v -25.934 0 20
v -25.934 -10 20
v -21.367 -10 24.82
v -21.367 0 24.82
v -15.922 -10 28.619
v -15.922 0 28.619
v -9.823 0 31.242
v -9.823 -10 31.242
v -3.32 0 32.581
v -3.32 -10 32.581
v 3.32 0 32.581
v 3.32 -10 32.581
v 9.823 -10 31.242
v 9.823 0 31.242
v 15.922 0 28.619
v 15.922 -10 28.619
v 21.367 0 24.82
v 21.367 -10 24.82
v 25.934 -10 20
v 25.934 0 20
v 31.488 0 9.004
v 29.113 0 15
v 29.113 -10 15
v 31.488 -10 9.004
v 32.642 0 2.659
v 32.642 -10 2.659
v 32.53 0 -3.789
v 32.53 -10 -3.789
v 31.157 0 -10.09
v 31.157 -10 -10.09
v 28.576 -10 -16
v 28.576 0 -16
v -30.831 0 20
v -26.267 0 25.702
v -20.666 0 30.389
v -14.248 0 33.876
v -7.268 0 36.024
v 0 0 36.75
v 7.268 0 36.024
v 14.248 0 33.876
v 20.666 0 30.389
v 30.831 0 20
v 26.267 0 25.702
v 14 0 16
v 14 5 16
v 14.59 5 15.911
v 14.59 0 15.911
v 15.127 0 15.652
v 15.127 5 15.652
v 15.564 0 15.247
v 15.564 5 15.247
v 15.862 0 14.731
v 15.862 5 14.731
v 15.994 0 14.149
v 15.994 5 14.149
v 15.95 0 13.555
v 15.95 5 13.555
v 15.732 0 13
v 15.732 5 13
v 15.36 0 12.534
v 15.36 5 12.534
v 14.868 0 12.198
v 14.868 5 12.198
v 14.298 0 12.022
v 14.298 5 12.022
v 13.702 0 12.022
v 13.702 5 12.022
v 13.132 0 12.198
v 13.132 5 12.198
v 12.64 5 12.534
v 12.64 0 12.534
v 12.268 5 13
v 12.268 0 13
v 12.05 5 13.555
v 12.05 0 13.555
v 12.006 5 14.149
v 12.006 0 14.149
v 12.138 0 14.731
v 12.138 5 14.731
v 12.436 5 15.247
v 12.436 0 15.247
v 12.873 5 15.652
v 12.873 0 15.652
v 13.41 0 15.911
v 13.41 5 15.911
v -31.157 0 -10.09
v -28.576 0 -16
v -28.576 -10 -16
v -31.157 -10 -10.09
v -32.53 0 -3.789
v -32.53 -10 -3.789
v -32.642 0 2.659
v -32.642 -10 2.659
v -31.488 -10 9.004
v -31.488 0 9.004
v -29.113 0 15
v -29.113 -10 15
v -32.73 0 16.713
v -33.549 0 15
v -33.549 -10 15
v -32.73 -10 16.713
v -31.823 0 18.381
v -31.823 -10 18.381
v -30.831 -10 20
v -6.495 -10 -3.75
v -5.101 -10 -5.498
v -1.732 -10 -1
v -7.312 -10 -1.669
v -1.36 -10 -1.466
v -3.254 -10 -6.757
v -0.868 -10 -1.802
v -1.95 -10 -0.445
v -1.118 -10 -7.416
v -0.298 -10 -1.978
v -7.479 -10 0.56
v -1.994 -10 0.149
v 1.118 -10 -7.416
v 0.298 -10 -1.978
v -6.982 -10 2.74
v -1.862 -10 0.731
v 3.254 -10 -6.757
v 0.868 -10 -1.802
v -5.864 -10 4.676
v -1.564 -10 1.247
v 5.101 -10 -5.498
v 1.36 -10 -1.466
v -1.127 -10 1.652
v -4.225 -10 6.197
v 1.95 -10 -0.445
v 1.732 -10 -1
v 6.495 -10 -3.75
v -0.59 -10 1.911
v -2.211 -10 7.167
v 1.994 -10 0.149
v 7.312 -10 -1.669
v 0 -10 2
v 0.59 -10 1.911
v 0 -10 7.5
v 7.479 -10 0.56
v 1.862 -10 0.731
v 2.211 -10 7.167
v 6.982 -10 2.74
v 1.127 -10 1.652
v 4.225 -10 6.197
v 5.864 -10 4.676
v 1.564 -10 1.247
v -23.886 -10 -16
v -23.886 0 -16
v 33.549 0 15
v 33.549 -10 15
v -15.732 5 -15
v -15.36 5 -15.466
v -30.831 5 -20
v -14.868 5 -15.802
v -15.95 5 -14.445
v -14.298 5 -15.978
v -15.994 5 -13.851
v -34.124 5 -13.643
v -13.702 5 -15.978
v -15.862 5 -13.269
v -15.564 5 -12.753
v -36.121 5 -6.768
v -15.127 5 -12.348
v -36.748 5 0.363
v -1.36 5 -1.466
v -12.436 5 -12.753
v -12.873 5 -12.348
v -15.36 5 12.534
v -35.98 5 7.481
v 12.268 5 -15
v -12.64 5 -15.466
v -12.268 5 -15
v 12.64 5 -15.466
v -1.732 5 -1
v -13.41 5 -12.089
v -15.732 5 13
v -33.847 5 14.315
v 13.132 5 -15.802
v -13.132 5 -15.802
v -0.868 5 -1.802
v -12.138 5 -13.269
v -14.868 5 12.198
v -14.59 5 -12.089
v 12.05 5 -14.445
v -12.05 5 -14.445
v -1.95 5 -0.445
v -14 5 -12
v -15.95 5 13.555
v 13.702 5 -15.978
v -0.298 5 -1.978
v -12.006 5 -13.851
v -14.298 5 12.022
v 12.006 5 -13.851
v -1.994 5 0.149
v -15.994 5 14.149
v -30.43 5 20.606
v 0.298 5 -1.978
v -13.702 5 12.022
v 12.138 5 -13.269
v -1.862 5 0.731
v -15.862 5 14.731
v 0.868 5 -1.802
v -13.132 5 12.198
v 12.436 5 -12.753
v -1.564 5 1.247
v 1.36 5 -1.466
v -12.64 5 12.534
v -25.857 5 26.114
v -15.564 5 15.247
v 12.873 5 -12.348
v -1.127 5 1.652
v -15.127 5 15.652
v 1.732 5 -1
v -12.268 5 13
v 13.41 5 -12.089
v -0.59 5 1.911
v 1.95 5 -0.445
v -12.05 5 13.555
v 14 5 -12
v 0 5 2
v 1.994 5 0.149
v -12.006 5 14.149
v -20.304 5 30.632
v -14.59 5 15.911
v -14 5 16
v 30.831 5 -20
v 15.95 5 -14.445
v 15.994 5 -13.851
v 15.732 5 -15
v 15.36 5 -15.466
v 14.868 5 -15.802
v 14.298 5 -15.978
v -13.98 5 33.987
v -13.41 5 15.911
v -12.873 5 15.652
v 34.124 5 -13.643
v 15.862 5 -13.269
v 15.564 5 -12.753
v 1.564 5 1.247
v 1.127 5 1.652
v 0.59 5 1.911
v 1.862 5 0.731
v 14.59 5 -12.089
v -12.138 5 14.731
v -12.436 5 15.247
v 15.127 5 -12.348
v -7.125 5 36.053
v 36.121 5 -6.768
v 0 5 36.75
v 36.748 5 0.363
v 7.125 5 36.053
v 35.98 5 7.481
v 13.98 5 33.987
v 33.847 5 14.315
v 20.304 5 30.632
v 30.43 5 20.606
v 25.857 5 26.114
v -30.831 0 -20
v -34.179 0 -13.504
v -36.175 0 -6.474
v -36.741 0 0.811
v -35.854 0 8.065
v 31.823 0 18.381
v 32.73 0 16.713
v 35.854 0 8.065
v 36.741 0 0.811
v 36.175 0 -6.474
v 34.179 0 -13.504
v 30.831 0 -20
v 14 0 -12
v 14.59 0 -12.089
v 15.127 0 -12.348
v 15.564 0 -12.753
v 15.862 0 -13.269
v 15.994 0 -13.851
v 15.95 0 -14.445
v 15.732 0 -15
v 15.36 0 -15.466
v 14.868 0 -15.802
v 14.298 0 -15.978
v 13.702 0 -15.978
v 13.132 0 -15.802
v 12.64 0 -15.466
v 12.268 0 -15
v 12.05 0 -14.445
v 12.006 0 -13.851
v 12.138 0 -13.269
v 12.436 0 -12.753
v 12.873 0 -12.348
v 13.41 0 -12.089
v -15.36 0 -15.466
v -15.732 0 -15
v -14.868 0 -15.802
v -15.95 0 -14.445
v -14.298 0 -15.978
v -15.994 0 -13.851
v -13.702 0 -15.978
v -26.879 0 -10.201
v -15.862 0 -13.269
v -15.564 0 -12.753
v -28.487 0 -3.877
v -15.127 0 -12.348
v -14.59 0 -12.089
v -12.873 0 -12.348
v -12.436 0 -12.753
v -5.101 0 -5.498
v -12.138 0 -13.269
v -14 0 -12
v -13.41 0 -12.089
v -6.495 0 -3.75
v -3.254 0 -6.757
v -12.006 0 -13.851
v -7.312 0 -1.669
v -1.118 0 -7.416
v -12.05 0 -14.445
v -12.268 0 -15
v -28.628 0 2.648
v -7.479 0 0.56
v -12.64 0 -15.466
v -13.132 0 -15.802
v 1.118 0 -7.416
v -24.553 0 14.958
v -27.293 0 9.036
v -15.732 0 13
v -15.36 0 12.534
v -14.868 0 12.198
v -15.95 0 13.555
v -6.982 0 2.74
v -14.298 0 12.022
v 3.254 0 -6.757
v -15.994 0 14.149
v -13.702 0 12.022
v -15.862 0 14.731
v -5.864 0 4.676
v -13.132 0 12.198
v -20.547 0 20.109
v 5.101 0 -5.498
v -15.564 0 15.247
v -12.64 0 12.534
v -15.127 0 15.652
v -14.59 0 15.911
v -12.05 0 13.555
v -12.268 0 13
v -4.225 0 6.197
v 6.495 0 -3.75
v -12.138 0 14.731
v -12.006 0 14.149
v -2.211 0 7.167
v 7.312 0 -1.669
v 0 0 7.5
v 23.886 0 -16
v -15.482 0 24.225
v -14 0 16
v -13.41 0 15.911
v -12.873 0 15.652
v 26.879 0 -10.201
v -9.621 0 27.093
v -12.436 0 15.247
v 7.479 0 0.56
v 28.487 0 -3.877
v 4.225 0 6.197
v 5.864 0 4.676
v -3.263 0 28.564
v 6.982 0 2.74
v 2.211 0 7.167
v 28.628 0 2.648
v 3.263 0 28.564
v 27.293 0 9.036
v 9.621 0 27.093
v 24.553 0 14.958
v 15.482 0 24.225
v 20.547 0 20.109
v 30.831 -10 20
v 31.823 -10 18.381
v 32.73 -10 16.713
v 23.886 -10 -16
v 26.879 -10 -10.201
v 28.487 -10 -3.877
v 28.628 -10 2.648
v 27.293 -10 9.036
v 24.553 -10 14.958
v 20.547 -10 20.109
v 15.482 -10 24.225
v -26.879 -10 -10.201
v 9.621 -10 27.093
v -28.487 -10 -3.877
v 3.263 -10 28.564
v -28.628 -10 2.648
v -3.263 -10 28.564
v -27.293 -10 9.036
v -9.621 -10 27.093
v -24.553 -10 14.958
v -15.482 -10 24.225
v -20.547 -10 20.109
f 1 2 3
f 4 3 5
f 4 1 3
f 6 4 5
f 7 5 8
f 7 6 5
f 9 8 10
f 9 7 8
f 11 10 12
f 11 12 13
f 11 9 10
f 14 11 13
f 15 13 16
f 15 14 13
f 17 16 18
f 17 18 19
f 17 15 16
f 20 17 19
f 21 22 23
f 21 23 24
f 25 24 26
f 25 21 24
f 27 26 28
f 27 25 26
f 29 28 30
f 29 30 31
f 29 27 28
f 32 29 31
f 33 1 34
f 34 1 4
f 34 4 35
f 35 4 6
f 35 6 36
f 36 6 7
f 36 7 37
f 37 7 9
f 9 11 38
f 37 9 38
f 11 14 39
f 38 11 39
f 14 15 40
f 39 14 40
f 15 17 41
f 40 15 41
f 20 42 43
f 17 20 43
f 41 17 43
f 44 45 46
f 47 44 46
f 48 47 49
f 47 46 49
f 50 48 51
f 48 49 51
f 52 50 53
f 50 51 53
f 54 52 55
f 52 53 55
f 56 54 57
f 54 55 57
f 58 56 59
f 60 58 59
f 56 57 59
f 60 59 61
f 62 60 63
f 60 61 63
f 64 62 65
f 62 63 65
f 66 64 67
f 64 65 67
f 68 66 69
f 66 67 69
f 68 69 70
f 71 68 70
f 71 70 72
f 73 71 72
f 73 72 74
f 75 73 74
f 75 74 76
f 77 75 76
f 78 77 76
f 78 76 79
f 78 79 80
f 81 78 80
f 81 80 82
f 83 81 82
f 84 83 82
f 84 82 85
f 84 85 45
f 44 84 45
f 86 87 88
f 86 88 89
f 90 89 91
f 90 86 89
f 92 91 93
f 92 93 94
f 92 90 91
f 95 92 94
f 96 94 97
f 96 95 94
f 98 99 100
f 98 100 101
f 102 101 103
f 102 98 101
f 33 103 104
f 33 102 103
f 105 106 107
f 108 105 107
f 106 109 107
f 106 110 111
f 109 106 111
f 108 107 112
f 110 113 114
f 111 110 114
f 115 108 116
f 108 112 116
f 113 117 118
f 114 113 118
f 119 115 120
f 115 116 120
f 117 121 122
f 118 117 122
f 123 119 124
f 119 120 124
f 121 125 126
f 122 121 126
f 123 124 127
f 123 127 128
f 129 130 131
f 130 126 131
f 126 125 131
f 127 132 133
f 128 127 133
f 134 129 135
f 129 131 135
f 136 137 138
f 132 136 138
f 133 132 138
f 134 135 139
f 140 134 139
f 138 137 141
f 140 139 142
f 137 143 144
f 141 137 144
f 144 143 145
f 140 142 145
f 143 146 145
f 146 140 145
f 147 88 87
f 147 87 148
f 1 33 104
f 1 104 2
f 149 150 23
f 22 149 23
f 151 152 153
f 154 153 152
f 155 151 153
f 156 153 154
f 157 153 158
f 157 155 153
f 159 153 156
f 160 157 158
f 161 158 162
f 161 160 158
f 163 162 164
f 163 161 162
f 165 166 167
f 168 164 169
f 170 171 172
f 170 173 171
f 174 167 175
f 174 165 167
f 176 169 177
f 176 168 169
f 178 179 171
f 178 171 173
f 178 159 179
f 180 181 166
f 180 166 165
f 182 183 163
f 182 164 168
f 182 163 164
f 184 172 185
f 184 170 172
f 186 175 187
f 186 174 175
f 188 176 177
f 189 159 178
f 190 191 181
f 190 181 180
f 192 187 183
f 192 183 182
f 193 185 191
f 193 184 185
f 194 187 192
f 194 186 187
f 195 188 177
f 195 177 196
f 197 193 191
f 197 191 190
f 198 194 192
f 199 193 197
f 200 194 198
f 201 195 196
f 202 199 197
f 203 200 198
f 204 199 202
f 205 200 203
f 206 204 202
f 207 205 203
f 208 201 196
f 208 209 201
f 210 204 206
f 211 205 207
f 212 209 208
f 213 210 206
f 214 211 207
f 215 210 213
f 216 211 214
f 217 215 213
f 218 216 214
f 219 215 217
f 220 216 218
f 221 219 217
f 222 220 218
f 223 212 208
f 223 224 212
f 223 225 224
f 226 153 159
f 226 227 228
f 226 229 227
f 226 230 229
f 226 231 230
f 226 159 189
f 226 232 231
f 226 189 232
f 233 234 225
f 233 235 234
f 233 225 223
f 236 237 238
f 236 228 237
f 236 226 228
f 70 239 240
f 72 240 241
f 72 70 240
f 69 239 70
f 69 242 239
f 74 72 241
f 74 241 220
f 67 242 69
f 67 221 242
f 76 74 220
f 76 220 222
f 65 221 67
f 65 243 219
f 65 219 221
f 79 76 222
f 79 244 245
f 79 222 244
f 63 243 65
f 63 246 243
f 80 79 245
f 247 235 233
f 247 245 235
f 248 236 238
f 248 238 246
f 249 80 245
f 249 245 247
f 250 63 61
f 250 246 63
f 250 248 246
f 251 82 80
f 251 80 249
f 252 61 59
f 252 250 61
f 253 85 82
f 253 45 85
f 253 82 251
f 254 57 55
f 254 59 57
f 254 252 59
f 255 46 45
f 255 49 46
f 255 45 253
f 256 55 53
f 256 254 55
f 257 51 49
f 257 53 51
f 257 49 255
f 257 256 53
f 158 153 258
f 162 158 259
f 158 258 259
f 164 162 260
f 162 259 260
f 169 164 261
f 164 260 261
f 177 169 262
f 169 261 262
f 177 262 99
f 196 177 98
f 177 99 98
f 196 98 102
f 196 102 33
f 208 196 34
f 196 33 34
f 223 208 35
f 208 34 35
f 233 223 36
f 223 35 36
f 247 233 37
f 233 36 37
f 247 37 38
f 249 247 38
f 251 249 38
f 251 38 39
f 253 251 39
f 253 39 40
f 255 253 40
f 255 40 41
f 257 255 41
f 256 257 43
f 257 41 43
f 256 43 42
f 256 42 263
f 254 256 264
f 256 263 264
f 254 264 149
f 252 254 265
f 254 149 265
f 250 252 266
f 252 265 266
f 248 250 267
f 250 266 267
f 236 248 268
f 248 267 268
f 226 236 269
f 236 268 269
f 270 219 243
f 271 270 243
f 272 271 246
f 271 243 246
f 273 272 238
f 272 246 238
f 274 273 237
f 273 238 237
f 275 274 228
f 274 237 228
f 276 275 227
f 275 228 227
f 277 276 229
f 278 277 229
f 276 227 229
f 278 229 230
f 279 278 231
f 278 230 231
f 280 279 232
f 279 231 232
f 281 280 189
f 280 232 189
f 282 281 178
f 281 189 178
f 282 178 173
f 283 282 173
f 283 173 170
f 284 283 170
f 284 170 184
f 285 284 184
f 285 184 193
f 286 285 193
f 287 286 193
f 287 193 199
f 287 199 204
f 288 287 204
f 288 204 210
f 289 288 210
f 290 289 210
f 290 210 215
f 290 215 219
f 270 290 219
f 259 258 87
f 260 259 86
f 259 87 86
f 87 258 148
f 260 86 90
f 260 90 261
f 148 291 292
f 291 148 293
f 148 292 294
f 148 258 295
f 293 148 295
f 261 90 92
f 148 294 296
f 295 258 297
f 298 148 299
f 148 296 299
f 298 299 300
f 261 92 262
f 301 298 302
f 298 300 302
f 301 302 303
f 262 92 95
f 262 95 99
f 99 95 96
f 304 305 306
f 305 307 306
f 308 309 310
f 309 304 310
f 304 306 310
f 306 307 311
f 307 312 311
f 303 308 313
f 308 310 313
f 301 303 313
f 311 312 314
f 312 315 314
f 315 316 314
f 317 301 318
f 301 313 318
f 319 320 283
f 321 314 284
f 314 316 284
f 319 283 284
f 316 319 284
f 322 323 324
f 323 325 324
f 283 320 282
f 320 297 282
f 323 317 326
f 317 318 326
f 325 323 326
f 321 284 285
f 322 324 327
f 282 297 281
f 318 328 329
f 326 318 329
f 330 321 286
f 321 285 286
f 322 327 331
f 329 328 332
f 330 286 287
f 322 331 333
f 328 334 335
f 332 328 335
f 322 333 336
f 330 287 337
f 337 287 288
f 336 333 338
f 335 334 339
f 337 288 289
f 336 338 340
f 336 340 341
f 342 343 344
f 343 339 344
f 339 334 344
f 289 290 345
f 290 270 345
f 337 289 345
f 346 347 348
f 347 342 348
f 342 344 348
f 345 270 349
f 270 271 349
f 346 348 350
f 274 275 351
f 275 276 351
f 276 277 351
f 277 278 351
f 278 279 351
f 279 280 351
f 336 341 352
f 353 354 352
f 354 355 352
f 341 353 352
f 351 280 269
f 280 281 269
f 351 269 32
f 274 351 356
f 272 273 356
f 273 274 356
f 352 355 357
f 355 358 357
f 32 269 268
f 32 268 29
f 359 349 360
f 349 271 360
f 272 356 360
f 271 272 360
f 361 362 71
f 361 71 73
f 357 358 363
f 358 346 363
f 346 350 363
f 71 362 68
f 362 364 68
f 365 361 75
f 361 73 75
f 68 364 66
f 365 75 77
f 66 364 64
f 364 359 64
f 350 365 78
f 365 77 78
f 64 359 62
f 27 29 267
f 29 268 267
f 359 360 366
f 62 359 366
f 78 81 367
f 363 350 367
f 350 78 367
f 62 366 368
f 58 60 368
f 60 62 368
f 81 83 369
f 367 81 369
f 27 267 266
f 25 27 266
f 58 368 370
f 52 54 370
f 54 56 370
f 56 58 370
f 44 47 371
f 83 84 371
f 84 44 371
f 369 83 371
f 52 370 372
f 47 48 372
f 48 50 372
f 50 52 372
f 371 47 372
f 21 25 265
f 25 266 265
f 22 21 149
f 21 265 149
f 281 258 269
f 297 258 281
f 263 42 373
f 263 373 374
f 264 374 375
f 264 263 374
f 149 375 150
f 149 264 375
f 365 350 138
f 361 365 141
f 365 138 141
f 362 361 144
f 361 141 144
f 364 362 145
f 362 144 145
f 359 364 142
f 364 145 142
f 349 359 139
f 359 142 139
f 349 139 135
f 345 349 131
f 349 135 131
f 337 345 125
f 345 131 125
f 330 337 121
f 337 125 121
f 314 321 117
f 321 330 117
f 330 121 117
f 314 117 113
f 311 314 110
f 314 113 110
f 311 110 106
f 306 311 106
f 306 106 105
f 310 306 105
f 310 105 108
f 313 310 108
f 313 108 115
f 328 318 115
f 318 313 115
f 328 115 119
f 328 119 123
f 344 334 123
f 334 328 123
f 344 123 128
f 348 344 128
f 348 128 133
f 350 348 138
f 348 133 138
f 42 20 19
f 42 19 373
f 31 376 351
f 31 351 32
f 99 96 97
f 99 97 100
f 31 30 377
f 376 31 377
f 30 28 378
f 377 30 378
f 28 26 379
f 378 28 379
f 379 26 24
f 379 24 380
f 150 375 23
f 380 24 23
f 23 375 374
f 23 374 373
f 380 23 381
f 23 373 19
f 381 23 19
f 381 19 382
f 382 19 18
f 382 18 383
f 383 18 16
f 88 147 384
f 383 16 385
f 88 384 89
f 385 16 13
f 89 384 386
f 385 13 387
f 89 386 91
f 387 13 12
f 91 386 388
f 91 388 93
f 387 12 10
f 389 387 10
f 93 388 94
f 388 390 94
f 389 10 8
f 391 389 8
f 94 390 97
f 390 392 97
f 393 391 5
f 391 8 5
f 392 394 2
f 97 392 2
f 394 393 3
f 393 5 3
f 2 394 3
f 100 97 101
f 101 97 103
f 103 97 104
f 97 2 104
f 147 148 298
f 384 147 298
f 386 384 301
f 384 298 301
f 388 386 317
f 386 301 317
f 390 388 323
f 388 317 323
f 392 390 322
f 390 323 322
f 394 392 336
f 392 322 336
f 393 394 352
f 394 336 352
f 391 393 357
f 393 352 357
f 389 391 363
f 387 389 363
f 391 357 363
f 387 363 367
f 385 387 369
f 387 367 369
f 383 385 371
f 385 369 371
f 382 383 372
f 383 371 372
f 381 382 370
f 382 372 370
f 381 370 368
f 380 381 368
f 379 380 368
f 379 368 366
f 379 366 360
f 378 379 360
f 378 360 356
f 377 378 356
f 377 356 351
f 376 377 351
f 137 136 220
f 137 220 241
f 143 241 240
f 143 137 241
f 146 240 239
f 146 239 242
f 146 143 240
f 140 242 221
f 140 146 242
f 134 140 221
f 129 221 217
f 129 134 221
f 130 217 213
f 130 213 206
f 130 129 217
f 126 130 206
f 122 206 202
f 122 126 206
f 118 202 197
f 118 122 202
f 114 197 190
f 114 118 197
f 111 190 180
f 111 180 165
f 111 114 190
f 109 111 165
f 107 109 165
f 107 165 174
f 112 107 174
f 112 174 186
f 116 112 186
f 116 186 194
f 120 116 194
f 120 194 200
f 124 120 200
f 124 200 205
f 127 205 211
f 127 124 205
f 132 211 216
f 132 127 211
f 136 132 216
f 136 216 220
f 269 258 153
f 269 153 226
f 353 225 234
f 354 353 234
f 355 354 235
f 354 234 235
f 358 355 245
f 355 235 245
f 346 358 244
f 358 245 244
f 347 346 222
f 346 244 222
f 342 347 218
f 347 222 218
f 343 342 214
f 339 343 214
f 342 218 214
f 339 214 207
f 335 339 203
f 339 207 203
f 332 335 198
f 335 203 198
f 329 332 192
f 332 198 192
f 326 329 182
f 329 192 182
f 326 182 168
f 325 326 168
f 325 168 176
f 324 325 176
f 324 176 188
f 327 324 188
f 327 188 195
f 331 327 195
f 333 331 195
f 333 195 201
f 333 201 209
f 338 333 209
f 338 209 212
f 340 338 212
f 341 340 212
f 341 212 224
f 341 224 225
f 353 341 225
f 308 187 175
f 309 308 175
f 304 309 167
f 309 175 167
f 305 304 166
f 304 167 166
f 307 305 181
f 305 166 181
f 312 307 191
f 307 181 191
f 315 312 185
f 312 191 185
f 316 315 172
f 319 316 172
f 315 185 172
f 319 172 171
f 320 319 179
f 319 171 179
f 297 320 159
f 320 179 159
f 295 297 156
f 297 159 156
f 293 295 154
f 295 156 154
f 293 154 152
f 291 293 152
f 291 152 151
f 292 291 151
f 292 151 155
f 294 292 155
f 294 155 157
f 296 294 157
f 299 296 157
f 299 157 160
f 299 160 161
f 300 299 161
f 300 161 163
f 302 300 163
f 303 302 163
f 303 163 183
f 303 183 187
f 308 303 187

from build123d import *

# Parameters (mm, degrees)
CYLINDER_DEPTH      = 5
CYLINDER_DEPTH_BACK = 10
SKETCH_1_R          = 7.5
SKETCH_1_R_2        = 2
SKETCH_2_R          = 36.75
SKETCH_2_R_2        = 2.5
BASE_HORIZONT_DEPTH = 5
SKETCH_3_R          = 32.75
SKETCH_3_R_2        = 28.75
EDGE_2_DEPTH        = 15
CUTOFF_DEPTH        = 10
CUTOFF_DEPTH_BACK   = 10
SKETCH_8_W          = 61.662387238
SKETCH_8_H          = 16.75
SKETCH_12_W         = 8
SKETCH_12_H         = 4
CUT_EXTRUDE_1_DEPTH = 10
EXTRUDE_2_DEPTH     = 10
SKETCH_14_R         = 2
CUT_EXTRUDE_3_DEPTH = 10


with BuildPart() as part:
    # Эскиз1 → cylinder (new, two sides: drawn at the far end of the back side and taken through both)
    with BuildSketch(Plane(origin=(0, 0, 0), x_dir=(1, 0, 0), z_dir=(0, 1, 0)).offset(-CYLINDER_DEPTH_BACK)):
        with Locations(Location((0, 0, 0), (0, 0, 270))):
            Circle(SKETCH_1_R)
        with Locations(Location((0, 0, 0), (0, 0, 270))):
            Circle(SKETCH_1_R_2, mode=Mode.SUBTRACT)
    extrude(amount=CYLINDER_DEPTH + CYLINDER_DEPTH_BACK)

    # Эскиз2 → base horizont (add)
    with BuildSketch(Plane(origin=(0, 0, 0), x_dir=(1, 0, 0), z_dir=(0, 1, 0))):
        with Locations(Location((0, 0, 0), (0, 0, 270))):
            Circle(SKETCH_2_R)
        Circle(SKETCH_2_R_2, mode=Mode.SUBTRACT)
    extrude(amount=BASE_HORIZONT_DEPTH)

    # Эскиз3 → edge 2 (add)
    with BuildSketch(Plane(origin=(0, 5, 0), x_dir=(1, 0, 0), z_dir=(0, 1, 0))):
        with Locations(Location((0, 0, 0), (0, 0, 270))):
            Circle(SKETCH_3_R)
        with Locations(Location((0, 0, 0), (0, 0, 270))):
            Circle(SKETCH_3_R_2, mode=Mode.SUBTRACT)
    extrude(amount=-EDGE_2_DEPTH)

    # Эскиз8 → cutoff (cut, two sides: drawn at the far end of the back side and taken through both)
    with BuildSketch(Plane(origin=(0, 0, 0), x_dir=(1, 0, 0), z_dir=(0, 1, 0)).offset(-CUTOFF_DEPTH_BACK)):
        with Locations((0, 28.375)):
            Rectangle(SKETCH_8_W, SKETCH_8_H)
    extrude(amount=CUTOFF_DEPTH + CUTOFF_DEPTH_BACK, mode=Mode.SUBTRACT)

    # Эскиз12 → Вытянуть1 (cut)
    with BuildSketch(Plane.XZ.offset(10)):
        with Locations((-24.575557737, -18)):
            Rectangle(SKETCH_12_W, SKETCH_12_H)
        with Locations((24.575557737, -18)):
            Rectangle(SKETCH_12_W, SKETCH_12_H)
    extrude(amount=-CUT_EXTRUDE_1_DEPTH, mode=Mode.SUBTRACT)

    # Эскиз13 → Вытянуть2 (add)
    with BuildSketch(Plane.XZ):
        with BuildLine():
            Line((-30.831193619, 20), (-25.933809978, 20))
            ThreePointArc((-25.933809978, 20), (-27.636674985, 17.572043016), (-29.112926682, 15))
            Line((-29.112926682, 15), (-33.54940387, 15))
            ThreePointArc((-33.54940387, 15), (-32.287231737, 17.552696851), (-30.831193619, 20))
        make_face()
        with BuildLine():
            Line((33.54940387, 15), (29.112926682, 15))
            ThreePointArc((29.112926682, 15), (27.636674985, 17.572043016), (25.933809978, 20))
            Line((25.933809978, 20), (30.831193619, 20))
            ThreePointArc((30.831193619, 20), (32.287231737, 17.552696851), (33.54940387, 15))
        make_face()
    extrude(amount=EXTRUDE_2_DEPTH)

    # Эскиз14 → Вытянуть3 (cut)
    with BuildSketch(Plane(origin=(0, 5, 0), x_dir=(1, 0, 0), z_dir=(0, 1, 0))):
        with Locations(Location((14, -14, 0), (0, 0, 270))):
            Circle(SKETCH_14_R)
        with Locations(Location((-14, -14, 0), (0, 0, 270))):
            Circle(SKETCH_14_R)
        with Locations(Location((-14, 14, 0), (0, 0, 270))):
            Circle(SKETCH_14_R)
        with Locations(Location((14, 14, 0), (0, 0, 270))):
            Circle(SKETCH_14_R)
    extrude(amount=-CUT_EXTRUDE_3_DEPTH, mode=Mode.SUBTRACT)


solid = part.part
